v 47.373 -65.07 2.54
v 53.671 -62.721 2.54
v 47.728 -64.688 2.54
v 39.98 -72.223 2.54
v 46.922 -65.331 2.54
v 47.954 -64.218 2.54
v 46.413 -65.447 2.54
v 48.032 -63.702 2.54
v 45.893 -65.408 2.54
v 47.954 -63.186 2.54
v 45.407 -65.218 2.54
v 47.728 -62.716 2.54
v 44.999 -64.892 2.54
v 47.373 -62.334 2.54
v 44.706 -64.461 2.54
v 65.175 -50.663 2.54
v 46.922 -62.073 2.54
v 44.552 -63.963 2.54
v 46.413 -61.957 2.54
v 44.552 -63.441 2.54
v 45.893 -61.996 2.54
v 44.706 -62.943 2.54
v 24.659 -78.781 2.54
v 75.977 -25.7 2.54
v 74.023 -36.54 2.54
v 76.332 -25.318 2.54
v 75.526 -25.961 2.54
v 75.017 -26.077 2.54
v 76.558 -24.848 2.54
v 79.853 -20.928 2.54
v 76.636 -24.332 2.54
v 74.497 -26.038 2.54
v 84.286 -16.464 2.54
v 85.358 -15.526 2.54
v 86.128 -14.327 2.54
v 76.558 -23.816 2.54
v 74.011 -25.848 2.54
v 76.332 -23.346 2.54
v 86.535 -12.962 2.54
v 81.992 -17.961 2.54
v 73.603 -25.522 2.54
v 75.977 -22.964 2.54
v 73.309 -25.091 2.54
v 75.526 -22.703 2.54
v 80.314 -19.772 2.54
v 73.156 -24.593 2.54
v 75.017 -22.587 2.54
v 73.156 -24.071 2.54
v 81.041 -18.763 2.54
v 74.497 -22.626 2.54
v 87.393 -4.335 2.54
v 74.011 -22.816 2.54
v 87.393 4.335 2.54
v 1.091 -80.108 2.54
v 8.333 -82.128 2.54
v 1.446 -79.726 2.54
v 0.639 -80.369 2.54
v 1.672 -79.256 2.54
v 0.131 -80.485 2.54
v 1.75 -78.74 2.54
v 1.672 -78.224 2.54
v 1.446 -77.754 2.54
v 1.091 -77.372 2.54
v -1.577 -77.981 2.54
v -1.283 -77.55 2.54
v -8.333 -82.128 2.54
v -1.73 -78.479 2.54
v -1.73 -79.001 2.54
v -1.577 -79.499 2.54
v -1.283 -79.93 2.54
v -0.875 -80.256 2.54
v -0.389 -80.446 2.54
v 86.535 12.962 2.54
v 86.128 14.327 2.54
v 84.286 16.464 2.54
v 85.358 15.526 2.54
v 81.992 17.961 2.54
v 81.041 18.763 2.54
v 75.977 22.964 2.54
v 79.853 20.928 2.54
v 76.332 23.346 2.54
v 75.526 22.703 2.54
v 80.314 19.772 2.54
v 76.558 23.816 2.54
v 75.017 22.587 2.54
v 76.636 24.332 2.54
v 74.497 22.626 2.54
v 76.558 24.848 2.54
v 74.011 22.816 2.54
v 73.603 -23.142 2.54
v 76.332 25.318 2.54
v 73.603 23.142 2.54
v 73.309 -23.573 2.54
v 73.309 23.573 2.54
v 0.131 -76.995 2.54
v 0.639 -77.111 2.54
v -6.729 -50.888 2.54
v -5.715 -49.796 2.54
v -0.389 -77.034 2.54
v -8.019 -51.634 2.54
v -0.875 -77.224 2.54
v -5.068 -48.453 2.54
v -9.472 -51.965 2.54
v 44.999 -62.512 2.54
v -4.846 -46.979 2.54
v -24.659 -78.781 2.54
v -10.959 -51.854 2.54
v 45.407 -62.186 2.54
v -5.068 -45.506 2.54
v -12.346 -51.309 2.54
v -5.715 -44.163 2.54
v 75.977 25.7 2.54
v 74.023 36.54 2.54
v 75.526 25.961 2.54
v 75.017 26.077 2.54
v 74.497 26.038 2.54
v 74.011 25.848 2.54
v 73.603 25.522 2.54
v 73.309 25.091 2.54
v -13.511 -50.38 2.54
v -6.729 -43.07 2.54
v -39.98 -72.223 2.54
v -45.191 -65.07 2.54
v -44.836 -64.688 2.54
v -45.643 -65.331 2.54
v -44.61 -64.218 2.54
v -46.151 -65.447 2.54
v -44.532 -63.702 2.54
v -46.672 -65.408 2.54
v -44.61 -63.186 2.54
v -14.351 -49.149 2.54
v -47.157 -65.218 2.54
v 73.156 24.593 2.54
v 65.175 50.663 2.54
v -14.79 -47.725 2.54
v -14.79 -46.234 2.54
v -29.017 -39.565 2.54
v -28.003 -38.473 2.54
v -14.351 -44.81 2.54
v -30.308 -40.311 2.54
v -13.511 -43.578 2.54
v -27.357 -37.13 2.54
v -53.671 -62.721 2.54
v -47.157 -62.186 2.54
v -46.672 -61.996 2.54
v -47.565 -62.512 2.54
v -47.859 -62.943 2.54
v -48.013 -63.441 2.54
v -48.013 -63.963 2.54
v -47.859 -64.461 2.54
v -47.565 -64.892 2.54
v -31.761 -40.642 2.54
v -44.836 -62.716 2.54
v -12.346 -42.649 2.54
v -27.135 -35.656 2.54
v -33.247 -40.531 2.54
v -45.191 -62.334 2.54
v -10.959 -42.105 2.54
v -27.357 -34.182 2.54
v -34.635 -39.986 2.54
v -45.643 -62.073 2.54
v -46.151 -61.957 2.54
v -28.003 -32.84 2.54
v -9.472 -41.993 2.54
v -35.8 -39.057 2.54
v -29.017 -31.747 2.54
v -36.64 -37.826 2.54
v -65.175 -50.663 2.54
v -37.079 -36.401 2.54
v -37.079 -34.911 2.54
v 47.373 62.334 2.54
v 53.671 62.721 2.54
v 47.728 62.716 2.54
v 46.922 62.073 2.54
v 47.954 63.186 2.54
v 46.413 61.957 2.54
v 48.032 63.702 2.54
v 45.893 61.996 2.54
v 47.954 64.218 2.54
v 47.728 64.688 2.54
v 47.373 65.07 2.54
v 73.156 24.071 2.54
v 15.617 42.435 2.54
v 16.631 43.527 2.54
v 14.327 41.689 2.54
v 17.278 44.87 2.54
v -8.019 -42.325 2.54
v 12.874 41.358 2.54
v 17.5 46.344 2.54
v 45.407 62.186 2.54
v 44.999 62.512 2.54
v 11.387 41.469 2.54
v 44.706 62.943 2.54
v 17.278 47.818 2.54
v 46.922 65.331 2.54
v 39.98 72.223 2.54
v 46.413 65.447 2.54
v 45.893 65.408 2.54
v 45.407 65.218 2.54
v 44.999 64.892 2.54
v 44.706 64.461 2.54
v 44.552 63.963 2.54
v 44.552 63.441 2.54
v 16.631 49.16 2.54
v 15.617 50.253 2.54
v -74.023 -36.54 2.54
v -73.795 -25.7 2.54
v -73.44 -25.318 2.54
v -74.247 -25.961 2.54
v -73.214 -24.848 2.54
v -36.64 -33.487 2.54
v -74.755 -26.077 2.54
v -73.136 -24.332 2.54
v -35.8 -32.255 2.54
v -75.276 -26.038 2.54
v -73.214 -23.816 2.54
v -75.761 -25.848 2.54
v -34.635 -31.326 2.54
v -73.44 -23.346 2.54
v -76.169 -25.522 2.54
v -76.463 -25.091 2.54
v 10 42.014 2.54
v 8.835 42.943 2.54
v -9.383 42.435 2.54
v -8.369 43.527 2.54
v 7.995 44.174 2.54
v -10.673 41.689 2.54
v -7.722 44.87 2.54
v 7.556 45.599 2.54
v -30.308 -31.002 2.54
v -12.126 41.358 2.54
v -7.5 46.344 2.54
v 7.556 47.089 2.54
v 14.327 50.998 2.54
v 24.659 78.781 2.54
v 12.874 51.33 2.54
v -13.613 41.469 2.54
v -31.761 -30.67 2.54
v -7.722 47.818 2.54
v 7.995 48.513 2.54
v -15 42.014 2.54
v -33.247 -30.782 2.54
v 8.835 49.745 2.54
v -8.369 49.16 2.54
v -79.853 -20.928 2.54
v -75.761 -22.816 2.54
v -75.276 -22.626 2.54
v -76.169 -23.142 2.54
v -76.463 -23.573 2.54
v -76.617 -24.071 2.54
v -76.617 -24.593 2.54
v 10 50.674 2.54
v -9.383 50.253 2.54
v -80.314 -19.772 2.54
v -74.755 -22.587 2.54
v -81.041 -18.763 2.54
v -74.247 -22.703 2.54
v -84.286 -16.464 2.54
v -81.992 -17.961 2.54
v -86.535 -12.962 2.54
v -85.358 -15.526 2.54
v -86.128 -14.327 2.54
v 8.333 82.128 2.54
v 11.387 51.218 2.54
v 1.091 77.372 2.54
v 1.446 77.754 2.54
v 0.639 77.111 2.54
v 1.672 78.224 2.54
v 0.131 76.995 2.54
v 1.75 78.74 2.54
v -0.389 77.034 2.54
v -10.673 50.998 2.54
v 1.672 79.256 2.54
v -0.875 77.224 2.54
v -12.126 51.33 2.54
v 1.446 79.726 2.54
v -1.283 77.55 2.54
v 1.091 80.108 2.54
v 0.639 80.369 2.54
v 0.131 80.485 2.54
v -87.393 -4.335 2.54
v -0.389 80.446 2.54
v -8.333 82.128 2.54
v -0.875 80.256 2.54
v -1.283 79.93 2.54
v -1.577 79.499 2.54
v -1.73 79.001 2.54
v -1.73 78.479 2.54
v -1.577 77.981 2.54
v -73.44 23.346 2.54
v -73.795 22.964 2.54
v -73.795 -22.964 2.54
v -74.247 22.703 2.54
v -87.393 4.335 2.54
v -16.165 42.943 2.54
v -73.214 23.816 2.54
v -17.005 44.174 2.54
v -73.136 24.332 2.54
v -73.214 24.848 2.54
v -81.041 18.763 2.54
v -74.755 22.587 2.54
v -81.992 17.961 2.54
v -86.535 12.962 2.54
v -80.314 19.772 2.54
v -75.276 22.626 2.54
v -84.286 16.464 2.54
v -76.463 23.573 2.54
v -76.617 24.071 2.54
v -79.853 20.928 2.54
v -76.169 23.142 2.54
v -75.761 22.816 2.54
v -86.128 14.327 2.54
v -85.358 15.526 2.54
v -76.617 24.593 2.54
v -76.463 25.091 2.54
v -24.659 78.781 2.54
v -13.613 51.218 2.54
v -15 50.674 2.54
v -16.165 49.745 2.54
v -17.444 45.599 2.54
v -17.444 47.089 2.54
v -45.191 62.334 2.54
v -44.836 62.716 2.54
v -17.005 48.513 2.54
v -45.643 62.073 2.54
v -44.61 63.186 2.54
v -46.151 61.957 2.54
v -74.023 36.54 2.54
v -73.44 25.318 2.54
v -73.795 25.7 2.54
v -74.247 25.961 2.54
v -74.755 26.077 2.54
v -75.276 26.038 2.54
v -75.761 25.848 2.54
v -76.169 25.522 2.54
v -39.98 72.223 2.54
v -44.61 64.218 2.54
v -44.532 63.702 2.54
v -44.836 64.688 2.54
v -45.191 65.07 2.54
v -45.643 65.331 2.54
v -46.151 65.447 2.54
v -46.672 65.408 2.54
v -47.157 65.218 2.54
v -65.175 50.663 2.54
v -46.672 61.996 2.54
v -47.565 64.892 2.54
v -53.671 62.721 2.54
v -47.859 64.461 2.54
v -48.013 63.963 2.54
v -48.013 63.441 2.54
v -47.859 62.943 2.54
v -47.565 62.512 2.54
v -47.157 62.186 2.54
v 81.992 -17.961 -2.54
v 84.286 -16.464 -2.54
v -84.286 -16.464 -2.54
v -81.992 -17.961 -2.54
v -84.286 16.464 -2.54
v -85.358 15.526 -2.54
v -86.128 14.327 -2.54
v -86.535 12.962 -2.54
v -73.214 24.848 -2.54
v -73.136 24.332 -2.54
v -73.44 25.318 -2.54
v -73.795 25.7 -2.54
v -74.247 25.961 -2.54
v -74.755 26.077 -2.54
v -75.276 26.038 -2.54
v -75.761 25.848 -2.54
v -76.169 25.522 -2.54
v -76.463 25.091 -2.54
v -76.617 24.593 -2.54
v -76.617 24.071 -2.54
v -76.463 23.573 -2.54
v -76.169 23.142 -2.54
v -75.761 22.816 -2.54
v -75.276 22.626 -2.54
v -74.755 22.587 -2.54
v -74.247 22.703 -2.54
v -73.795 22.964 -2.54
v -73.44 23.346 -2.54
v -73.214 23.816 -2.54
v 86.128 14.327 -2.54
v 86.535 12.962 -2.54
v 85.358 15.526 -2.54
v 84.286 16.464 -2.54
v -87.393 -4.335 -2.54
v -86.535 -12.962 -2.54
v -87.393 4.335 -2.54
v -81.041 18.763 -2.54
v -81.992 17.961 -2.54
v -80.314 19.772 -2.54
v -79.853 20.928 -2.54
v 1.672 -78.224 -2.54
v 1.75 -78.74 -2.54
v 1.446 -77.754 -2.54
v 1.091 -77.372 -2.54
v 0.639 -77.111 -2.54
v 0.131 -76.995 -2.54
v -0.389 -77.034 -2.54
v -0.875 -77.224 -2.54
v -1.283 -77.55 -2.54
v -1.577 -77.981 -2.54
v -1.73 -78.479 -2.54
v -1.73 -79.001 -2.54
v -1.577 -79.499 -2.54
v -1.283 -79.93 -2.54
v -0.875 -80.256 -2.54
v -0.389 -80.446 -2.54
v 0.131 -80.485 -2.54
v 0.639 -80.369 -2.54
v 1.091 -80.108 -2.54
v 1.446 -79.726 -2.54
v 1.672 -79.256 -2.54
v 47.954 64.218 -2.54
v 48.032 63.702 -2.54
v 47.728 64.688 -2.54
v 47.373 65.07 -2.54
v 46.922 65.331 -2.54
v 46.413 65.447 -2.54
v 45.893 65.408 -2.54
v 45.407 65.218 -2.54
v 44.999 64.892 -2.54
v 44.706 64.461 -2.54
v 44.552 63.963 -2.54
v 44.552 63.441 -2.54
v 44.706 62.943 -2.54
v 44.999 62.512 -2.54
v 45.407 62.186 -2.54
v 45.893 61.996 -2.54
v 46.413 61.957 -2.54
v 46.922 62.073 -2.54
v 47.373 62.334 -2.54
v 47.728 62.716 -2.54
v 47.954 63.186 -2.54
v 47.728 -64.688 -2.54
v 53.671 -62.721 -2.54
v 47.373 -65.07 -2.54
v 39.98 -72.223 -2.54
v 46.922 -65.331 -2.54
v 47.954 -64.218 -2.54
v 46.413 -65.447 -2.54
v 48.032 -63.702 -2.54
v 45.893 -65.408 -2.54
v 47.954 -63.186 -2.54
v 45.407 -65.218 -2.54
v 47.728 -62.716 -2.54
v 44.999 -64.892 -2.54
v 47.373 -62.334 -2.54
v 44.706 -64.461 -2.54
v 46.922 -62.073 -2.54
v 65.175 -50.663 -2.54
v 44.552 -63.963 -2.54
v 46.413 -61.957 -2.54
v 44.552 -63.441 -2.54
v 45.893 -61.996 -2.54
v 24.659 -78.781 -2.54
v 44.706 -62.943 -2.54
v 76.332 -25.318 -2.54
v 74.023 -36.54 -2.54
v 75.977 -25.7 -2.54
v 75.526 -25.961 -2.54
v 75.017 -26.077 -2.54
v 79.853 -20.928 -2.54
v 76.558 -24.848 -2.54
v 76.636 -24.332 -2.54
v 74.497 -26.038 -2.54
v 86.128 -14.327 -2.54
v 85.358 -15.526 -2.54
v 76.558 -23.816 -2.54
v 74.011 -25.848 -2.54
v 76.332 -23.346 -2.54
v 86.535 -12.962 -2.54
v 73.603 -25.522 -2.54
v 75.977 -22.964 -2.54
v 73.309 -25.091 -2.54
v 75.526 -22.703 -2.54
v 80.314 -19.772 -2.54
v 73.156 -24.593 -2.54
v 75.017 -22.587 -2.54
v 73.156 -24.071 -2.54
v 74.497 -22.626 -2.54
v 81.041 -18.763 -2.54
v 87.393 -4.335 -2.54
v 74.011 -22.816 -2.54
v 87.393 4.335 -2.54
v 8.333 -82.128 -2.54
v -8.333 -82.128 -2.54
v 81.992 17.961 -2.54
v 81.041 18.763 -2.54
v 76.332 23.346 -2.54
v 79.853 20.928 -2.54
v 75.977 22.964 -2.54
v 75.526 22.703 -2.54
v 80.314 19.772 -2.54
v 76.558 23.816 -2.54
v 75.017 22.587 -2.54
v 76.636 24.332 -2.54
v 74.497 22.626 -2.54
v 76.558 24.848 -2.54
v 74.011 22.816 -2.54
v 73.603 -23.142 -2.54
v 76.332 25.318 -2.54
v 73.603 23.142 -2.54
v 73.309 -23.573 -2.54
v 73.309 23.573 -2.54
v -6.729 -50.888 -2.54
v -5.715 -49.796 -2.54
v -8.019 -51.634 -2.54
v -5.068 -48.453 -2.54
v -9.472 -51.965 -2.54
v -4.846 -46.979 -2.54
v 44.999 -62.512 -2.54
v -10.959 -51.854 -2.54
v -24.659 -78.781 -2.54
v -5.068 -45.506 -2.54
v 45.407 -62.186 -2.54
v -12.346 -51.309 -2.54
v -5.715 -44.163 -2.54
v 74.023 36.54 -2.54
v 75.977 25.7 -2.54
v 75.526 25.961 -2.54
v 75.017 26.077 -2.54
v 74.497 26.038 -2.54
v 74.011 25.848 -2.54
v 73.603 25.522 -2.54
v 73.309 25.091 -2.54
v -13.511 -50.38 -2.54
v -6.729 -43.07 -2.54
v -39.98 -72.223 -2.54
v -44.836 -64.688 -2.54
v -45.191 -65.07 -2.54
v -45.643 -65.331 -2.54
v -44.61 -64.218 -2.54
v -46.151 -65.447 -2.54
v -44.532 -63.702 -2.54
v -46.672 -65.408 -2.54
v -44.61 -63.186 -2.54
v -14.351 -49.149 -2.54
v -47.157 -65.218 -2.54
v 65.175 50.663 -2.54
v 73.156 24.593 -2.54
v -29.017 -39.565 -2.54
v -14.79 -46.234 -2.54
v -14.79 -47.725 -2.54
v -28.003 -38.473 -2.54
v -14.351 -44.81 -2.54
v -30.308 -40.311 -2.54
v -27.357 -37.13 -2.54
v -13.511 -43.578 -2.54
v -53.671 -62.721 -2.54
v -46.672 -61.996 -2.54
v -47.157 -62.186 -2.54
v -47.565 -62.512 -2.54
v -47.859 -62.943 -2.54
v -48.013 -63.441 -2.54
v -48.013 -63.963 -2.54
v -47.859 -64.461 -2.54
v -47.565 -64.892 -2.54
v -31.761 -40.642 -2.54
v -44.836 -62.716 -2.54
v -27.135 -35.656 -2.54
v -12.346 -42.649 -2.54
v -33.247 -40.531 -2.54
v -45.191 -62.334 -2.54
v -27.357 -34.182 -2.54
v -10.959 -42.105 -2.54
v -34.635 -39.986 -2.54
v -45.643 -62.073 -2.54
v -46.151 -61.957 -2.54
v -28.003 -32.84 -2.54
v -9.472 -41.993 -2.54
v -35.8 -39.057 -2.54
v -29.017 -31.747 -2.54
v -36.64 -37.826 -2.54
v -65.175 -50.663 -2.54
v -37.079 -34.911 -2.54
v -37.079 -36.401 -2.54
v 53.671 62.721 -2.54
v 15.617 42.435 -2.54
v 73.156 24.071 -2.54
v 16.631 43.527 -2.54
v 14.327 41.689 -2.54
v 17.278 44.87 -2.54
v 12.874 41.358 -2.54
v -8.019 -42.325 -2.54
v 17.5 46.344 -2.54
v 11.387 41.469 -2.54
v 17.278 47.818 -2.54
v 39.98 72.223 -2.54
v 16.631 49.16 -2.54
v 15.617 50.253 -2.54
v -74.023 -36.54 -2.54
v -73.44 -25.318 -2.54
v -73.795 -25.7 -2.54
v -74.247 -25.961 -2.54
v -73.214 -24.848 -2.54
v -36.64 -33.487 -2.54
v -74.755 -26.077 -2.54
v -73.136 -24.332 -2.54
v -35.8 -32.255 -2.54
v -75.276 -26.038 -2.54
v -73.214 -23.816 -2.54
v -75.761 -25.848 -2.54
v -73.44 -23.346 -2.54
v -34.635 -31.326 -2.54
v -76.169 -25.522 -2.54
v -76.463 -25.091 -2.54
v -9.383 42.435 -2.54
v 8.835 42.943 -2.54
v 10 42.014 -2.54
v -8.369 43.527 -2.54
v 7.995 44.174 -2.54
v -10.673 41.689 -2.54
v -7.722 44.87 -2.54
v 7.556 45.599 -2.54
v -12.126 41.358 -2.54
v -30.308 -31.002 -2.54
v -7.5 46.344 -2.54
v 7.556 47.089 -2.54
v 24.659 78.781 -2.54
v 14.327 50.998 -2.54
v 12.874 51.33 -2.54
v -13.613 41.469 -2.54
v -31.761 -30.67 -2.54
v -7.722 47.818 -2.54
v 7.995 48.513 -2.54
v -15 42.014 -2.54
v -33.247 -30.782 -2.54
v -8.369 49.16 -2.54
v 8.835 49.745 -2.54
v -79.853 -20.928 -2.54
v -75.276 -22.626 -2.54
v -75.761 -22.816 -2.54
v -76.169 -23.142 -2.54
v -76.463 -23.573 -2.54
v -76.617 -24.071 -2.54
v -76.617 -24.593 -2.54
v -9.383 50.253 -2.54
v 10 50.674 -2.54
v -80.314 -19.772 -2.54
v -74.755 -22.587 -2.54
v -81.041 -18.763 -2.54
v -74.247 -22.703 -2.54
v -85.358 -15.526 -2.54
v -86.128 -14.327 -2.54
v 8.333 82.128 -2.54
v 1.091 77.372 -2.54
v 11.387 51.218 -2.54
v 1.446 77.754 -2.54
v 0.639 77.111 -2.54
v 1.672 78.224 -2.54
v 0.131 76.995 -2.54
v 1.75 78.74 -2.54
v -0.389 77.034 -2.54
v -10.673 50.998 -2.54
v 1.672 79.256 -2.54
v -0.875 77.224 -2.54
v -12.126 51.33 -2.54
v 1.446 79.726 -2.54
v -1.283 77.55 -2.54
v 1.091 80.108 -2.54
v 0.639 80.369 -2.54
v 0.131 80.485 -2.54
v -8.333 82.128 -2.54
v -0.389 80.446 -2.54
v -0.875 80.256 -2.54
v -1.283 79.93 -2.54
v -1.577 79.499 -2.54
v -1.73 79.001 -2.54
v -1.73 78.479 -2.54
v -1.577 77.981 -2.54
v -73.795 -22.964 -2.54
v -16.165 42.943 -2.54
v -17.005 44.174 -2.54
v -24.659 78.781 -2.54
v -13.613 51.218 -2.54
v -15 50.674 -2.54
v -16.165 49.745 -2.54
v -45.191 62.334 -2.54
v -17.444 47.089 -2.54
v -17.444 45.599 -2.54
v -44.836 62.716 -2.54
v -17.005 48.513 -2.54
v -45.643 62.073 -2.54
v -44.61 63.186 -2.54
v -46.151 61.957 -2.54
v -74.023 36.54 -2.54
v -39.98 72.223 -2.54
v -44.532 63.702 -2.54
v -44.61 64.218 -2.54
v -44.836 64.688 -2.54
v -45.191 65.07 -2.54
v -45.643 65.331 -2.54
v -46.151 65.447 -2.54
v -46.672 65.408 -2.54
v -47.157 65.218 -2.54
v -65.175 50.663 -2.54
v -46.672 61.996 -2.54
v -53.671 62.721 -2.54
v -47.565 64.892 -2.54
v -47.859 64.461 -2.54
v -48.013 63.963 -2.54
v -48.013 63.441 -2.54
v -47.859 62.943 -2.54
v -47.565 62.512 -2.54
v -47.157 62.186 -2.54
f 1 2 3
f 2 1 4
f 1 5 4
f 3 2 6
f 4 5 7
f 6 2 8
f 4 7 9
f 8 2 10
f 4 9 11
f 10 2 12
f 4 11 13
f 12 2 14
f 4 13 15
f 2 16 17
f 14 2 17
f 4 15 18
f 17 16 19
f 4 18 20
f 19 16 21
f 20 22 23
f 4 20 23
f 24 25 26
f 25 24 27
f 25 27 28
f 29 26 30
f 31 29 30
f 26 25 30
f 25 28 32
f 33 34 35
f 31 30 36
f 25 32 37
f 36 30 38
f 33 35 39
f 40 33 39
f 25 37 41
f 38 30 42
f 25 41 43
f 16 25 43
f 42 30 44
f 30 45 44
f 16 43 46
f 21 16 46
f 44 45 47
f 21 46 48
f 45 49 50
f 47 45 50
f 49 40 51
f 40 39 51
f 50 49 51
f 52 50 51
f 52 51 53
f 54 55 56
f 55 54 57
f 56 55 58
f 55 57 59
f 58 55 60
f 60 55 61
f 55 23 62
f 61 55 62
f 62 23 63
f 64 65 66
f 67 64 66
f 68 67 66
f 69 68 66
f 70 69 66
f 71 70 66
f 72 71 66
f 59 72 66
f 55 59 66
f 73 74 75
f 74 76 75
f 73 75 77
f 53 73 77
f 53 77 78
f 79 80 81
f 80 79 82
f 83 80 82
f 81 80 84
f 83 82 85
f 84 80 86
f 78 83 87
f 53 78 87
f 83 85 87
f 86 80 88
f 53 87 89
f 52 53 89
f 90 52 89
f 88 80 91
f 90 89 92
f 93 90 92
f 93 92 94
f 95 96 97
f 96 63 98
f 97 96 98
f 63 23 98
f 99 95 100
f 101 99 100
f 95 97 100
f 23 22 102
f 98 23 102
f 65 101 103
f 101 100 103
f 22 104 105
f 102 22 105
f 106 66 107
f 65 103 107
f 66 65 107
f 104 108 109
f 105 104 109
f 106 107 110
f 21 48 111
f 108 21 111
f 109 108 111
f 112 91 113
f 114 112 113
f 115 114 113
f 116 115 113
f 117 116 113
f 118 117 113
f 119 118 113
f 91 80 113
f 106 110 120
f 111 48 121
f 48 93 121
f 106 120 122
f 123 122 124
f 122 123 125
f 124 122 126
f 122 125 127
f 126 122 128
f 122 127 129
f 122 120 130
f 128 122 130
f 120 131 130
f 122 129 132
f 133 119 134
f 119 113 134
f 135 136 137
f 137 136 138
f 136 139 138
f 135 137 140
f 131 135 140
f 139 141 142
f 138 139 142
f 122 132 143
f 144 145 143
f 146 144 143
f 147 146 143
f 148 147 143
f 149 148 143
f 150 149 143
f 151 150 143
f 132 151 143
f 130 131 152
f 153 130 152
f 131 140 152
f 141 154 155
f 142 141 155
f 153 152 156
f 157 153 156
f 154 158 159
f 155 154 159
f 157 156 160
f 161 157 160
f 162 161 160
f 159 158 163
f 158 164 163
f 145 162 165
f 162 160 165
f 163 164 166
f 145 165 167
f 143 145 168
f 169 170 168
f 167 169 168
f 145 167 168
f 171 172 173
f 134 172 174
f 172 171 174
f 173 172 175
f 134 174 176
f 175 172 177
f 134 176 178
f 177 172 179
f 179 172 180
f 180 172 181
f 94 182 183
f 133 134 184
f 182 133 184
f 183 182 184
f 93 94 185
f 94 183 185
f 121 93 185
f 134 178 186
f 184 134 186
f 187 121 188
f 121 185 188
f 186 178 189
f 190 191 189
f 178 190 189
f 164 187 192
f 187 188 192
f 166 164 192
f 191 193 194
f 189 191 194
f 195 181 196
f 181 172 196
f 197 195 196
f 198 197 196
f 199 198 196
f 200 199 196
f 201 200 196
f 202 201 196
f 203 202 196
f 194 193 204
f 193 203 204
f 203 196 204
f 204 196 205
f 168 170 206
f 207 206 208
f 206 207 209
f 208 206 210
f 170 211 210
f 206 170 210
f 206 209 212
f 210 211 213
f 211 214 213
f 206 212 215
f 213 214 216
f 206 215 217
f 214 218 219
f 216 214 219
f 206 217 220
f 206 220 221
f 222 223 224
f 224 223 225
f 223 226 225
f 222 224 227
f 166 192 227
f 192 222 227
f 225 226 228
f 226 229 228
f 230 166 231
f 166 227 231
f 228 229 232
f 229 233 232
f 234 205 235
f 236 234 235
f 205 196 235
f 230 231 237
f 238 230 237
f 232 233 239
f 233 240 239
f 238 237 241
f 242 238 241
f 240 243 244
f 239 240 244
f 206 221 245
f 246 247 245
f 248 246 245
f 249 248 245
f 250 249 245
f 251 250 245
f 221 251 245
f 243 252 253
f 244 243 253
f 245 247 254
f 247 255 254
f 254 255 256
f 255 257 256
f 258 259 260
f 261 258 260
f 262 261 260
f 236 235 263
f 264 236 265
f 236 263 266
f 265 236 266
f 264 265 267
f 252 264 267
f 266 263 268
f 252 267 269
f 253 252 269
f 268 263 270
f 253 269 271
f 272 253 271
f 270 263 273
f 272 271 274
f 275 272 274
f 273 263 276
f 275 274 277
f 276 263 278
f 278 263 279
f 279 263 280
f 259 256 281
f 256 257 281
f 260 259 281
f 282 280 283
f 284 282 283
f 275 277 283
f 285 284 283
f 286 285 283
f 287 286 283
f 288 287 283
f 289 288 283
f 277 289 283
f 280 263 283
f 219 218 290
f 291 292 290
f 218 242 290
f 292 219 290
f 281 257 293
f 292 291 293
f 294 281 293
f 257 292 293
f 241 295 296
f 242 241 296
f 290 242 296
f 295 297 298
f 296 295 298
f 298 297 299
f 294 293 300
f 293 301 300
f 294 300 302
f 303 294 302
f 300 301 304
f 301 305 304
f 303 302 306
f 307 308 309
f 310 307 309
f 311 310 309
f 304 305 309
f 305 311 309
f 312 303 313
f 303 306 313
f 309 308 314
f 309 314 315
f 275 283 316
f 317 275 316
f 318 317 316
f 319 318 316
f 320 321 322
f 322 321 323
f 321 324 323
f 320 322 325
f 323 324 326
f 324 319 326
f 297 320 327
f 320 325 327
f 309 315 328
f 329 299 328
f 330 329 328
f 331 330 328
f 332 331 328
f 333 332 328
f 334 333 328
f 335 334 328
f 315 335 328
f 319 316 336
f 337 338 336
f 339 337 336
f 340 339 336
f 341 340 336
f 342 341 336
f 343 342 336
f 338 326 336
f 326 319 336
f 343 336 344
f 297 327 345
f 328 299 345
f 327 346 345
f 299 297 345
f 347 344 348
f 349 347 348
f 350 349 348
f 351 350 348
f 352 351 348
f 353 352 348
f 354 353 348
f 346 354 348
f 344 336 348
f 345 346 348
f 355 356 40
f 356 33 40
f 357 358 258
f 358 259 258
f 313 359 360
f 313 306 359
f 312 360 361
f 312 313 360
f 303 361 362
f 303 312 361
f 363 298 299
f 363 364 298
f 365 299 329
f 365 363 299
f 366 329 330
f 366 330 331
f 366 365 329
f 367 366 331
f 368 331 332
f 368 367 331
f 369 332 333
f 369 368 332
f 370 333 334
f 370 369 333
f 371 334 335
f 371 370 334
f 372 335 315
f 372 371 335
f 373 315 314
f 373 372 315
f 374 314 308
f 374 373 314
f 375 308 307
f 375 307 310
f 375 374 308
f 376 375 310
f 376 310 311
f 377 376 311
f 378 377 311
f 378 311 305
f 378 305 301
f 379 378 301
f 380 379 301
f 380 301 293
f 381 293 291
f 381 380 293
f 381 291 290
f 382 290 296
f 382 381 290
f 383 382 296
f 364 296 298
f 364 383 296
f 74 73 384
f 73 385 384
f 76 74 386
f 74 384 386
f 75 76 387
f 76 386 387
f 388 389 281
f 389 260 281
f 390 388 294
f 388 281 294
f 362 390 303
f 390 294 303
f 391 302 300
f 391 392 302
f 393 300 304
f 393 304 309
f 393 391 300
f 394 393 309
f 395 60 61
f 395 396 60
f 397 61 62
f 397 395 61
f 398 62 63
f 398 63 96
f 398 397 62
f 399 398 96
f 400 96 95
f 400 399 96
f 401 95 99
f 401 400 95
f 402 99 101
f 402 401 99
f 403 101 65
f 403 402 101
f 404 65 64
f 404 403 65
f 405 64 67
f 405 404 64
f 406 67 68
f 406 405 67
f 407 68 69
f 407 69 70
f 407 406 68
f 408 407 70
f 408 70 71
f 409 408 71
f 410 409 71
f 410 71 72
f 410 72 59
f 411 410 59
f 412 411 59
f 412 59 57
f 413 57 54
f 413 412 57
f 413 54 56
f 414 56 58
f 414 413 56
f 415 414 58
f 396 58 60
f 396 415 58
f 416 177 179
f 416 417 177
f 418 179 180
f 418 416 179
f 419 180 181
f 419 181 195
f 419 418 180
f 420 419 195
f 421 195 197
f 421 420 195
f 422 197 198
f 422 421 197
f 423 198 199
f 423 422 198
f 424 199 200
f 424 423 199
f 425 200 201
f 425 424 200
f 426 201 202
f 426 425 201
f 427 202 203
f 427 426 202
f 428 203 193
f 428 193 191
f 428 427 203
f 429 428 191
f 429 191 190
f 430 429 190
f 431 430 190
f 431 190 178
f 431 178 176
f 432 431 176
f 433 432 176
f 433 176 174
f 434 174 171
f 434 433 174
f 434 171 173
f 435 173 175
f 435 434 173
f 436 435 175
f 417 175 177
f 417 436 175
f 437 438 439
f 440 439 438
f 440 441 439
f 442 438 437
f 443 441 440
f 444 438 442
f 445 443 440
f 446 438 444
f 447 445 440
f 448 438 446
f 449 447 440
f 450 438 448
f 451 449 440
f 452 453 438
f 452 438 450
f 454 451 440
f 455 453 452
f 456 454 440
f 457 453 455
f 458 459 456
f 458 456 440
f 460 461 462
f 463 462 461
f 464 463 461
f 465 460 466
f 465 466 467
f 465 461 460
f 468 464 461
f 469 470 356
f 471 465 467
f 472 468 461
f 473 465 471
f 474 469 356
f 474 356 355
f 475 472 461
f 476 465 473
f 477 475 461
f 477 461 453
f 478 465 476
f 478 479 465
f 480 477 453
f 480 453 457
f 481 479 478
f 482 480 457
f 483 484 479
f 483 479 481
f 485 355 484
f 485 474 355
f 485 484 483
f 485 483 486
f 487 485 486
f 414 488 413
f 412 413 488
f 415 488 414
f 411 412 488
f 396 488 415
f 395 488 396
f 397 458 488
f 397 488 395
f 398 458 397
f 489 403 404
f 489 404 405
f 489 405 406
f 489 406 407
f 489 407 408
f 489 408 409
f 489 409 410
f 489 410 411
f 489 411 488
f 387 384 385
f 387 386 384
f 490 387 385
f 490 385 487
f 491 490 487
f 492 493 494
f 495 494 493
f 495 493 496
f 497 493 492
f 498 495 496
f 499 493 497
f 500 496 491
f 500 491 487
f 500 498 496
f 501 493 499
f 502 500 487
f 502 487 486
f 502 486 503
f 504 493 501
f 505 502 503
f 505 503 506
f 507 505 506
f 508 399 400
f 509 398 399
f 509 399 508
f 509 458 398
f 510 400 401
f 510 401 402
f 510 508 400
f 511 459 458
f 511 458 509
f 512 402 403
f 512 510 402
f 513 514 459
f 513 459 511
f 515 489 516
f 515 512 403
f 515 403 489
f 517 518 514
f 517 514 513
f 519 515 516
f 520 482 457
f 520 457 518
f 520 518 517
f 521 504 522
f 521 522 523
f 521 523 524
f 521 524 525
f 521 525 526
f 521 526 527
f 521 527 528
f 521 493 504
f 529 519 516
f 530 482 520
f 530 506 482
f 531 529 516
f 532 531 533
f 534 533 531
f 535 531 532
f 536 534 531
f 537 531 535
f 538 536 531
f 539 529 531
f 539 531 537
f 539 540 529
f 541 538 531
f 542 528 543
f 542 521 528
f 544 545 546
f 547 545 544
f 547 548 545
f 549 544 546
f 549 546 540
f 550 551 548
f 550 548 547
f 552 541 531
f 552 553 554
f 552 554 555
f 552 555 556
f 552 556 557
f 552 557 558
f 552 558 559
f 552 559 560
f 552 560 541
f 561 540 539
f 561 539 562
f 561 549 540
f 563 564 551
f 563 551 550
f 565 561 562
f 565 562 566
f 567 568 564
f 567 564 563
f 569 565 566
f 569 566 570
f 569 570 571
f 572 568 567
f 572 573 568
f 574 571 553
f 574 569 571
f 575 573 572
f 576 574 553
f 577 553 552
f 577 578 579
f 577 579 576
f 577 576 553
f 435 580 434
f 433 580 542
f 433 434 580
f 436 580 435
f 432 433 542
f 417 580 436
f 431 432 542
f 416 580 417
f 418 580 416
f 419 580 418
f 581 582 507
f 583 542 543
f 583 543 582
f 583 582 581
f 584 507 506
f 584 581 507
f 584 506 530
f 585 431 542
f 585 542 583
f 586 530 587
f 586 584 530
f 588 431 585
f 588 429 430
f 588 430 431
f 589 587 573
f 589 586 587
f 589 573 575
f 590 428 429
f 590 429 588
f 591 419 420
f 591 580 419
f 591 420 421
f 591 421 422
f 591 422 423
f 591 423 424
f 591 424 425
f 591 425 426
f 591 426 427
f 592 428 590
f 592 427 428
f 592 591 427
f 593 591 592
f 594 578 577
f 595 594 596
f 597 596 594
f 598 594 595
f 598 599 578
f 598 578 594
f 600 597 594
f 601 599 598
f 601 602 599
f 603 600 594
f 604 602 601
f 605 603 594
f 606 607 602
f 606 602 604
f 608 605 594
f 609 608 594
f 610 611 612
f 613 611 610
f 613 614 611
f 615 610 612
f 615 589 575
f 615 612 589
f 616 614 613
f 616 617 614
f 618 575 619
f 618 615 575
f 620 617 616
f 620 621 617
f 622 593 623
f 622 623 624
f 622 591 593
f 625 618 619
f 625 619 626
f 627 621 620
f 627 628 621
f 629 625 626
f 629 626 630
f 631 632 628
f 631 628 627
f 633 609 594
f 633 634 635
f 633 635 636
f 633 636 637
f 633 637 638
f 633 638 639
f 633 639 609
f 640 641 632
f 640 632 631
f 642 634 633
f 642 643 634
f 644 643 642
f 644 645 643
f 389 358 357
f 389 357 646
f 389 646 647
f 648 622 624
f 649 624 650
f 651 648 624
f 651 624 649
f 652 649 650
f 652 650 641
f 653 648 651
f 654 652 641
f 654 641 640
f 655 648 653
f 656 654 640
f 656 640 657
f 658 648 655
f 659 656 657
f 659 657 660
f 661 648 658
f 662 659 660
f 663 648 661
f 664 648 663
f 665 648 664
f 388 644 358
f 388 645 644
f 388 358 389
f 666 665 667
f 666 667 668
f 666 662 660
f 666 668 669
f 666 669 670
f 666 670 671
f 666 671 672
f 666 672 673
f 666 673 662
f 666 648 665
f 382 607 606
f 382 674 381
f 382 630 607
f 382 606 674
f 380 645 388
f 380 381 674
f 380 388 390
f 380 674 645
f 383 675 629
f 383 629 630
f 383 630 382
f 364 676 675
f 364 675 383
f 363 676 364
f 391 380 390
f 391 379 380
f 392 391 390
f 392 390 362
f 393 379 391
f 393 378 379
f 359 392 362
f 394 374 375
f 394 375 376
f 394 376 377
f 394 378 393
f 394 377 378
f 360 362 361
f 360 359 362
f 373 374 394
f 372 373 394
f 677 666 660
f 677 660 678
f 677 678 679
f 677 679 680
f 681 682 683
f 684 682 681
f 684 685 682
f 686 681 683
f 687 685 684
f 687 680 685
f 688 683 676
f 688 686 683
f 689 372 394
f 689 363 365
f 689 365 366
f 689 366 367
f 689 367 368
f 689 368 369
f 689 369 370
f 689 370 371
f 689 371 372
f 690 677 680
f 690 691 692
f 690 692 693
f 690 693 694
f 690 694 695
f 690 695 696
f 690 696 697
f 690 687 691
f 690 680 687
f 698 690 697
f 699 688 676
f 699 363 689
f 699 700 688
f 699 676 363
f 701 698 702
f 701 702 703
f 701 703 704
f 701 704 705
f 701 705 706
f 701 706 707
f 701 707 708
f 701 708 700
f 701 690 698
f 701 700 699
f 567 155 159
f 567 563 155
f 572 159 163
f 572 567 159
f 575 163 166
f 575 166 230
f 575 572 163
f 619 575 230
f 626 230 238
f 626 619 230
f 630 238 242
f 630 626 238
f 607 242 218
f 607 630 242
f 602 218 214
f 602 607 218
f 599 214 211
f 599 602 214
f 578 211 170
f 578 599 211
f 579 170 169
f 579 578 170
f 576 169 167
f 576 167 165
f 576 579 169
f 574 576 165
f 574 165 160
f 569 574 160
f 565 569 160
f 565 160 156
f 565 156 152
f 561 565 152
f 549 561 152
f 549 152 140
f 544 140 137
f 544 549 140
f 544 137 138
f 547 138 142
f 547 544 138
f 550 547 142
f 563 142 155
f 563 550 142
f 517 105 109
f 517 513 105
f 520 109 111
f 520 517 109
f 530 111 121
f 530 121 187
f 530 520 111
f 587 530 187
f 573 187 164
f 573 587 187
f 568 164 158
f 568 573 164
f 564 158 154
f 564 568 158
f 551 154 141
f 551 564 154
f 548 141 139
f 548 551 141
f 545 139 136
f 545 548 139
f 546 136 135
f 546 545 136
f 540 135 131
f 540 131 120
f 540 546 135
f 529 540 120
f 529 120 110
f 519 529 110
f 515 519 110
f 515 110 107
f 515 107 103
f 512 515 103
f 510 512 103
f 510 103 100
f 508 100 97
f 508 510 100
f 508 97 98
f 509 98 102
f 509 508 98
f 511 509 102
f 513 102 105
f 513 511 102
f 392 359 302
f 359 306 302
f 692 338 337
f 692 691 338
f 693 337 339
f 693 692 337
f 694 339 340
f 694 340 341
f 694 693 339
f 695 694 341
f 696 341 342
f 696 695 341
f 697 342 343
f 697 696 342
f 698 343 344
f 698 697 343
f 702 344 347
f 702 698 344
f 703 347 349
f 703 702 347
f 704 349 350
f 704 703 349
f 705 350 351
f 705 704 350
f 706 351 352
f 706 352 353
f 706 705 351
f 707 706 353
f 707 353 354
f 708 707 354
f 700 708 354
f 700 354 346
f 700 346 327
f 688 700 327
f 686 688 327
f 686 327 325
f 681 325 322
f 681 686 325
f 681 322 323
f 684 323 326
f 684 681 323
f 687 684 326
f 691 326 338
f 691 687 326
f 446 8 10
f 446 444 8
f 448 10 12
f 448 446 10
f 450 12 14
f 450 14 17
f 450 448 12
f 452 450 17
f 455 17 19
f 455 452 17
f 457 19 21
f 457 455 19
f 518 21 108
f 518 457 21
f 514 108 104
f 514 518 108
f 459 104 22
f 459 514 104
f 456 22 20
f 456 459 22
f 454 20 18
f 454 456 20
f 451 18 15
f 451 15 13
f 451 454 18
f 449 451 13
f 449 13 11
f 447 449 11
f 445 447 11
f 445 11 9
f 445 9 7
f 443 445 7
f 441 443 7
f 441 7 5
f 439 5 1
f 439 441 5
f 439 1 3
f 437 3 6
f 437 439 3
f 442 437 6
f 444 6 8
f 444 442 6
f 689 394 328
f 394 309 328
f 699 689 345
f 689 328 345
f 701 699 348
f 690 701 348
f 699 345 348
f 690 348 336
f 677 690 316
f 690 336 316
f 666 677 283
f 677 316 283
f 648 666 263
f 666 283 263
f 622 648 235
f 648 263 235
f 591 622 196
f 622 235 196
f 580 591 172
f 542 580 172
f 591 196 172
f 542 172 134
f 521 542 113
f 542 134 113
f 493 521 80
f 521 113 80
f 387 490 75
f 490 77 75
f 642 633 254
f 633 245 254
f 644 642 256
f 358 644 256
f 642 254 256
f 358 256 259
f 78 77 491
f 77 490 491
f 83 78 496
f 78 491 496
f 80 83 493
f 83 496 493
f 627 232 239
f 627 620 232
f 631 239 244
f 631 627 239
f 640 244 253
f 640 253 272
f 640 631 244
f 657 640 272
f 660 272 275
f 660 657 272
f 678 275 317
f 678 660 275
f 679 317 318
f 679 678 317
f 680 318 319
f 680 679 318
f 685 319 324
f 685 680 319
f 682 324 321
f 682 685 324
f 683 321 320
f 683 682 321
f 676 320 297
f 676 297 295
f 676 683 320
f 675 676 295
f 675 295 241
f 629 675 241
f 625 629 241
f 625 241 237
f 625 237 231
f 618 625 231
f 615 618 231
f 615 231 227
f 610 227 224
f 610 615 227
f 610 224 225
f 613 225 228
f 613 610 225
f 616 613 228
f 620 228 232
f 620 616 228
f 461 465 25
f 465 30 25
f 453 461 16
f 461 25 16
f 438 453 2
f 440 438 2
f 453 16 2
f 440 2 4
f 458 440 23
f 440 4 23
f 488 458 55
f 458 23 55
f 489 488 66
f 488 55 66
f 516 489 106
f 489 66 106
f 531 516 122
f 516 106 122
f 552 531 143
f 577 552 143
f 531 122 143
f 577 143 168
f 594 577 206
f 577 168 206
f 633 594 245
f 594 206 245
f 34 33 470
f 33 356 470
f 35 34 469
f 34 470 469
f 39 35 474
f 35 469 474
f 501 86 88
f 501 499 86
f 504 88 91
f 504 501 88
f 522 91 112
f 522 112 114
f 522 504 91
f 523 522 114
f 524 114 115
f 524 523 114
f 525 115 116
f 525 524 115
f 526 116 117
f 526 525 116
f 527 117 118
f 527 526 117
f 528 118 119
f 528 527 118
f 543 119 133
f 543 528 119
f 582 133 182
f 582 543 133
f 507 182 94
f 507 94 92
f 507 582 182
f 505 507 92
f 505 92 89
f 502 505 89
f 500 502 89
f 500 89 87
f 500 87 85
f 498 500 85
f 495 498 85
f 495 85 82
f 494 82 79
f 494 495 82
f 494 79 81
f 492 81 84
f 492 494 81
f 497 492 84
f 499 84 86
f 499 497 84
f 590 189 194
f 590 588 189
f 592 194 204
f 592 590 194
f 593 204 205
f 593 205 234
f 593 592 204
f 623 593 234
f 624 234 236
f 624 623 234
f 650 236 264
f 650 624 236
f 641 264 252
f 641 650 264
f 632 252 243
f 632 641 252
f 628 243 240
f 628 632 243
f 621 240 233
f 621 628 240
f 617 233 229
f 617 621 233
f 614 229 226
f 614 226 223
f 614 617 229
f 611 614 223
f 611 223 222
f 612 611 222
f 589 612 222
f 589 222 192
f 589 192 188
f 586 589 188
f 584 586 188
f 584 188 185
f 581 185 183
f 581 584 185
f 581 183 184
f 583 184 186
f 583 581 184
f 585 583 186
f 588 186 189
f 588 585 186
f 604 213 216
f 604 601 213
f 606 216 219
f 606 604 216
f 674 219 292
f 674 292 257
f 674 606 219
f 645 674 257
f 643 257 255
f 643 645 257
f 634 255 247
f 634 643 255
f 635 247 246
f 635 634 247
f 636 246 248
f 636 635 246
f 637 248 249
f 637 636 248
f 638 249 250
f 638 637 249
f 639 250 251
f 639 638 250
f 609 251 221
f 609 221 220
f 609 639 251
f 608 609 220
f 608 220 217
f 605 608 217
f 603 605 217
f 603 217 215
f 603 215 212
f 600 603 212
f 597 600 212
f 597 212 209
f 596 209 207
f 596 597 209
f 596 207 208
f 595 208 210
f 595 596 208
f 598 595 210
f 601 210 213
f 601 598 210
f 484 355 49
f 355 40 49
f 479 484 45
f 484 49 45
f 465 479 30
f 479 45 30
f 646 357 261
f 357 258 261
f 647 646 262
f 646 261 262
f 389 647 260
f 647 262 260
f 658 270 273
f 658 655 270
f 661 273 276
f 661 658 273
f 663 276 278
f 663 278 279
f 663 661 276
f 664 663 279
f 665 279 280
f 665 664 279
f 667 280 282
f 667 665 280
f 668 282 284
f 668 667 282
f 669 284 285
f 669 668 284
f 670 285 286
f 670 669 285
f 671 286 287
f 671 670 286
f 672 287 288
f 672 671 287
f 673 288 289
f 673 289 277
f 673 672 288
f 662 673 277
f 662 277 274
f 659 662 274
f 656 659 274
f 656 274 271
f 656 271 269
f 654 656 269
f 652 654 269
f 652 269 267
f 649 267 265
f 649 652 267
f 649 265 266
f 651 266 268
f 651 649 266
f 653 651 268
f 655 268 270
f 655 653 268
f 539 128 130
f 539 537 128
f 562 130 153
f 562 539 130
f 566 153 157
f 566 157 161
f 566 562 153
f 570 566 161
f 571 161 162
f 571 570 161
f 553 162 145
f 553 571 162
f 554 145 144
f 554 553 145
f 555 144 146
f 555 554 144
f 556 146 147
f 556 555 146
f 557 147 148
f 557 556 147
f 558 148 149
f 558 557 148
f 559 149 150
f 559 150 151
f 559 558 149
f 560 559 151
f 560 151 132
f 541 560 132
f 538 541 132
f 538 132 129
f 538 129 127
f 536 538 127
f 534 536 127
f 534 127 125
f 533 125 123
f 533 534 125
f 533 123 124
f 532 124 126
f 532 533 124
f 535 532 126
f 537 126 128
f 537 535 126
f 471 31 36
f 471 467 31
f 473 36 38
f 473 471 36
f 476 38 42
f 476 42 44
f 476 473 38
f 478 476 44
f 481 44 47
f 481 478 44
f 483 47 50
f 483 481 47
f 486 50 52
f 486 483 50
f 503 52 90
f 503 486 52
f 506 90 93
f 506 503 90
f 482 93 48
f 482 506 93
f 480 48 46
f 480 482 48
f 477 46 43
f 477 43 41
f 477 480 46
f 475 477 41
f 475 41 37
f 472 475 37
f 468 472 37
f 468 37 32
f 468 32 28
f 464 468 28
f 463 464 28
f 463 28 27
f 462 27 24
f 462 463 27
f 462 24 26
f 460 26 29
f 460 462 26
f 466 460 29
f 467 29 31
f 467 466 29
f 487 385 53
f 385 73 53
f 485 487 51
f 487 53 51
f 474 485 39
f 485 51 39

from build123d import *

# Parameters (mm, degrees)
SKETCH1_R           = 1.75
SKETCH1_R_2         = 5
BOSS_EXTRUDE1_DEPTH = 2.54
FILLET1_R           = 5.08


with BuildPart() as part:
    # Sketch1 → Boss-Extrude1 (new, symmetric)
    with BuildSketch(Plane.XY):
        with BuildLine():
            Line((-86.162592811, 15.24), (-80.321852568, 19.05))
            ThreePointArc((-80.321852568, 19.05), (0, 82.55), (80.321852568, 19.05))
            Line((80.321852568, 19.05), (86.162592811, 15.24))
            ThreePointArc((86.162592811, 15.24), (87.5, 0), (86.162592811, -15.24))
            Line((86.162592811, -15.24), (80.321852568, -19.05))
            ThreePointArc((80.321852568, -19.05), (0, -82.55), (-80.321852568, -19.05))
            Line((-80.321852568, -19.05), (-86.162592811, -15.24))
            ThreePointArc((-86.162592811, -15.24), (-87.5, 0), (-86.162592811, 15.24))
        make_face()
        with Locations((0, 78.74)):
            Circle(SKETCH1_R, mode=Mode.SUBTRACT)
        with Locations((46.282210766, 63.701998137)):
            Circle(SKETCH1_R, mode=Mode.SUBTRACT)
        with Locations((74.886190093, 24.331998137)):
            Circle(SKETCH1_R, mode=Mode.SUBTRACT)
        with Locations((74.886190093, -24.331998137)):
            Circle(SKETCH1_R, mode=Mode.SUBTRACT)
        with Locations((46.282210766, -63.701998137)):
            Circle(SKETCH1_R, mode=Mode.SUBTRACT)
        with Locations((0, -78.74)):
            Circle(SKETCH1_R, mode=Mode.SUBTRACT)
        with Locations((-46.282210766, -63.701998137)):
            Circle(SKETCH1_R, mode=Mode.SUBTRACT)
        with Locations((-74.886190093, -24.331998137)):
            Circle(SKETCH1_R, mode=Mode.SUBTRACT)
        with Locations((-74.886190093, 24.331998137)):
            Circle(SKETCH1_R, mode=Mode.SUBTRACT)
        with Locations((-46.282210766, 63.701998137)):
            Circle(SKETCH1_R, mode=Mode.SUBTRACT)
        with Locations((-32.134671235, -35.656176248)):
            Circle(SKETCH1_R_2, mode=Mode.SUBTRACT)
        with Locations((-9.845967479, -46.979324435)):
            Circle(SKETCH1_R_2, mode=Mode.SUBTRACT)
        with Locations((-12.5, 46.343823752)):
            Circle(SKETCH1_R_2, mode=Mode.SUBTRACT)
        with Locations((12.5, 46.343823752)):
            Circle(SKETCH1_R_2, mode=Mode.SUBTRACT)
    extrude(amount=BOSS_EXTRUDE1_DEPTH, both=True)

    # Fillet1
    fillet1_edges = [part.edges().sort_by_distance(p)[0] for p in [
        (-86.162592811, 15.24, 0),
        (-80.321852568, 19.05, 0),
        (80.321852568, 19.05, 0),
        (86.162592811, 15.24, 0),
        (86.162592811, -15.24, 0),
        (80.321852568, -19.05, 0),
        (-80.321852568, -19.05, 0),
        (-86.162592811, -15.24, 0),
    ]]
    fillet(fillet1_edges, radius=FILLET1_R)


solid = part.part
